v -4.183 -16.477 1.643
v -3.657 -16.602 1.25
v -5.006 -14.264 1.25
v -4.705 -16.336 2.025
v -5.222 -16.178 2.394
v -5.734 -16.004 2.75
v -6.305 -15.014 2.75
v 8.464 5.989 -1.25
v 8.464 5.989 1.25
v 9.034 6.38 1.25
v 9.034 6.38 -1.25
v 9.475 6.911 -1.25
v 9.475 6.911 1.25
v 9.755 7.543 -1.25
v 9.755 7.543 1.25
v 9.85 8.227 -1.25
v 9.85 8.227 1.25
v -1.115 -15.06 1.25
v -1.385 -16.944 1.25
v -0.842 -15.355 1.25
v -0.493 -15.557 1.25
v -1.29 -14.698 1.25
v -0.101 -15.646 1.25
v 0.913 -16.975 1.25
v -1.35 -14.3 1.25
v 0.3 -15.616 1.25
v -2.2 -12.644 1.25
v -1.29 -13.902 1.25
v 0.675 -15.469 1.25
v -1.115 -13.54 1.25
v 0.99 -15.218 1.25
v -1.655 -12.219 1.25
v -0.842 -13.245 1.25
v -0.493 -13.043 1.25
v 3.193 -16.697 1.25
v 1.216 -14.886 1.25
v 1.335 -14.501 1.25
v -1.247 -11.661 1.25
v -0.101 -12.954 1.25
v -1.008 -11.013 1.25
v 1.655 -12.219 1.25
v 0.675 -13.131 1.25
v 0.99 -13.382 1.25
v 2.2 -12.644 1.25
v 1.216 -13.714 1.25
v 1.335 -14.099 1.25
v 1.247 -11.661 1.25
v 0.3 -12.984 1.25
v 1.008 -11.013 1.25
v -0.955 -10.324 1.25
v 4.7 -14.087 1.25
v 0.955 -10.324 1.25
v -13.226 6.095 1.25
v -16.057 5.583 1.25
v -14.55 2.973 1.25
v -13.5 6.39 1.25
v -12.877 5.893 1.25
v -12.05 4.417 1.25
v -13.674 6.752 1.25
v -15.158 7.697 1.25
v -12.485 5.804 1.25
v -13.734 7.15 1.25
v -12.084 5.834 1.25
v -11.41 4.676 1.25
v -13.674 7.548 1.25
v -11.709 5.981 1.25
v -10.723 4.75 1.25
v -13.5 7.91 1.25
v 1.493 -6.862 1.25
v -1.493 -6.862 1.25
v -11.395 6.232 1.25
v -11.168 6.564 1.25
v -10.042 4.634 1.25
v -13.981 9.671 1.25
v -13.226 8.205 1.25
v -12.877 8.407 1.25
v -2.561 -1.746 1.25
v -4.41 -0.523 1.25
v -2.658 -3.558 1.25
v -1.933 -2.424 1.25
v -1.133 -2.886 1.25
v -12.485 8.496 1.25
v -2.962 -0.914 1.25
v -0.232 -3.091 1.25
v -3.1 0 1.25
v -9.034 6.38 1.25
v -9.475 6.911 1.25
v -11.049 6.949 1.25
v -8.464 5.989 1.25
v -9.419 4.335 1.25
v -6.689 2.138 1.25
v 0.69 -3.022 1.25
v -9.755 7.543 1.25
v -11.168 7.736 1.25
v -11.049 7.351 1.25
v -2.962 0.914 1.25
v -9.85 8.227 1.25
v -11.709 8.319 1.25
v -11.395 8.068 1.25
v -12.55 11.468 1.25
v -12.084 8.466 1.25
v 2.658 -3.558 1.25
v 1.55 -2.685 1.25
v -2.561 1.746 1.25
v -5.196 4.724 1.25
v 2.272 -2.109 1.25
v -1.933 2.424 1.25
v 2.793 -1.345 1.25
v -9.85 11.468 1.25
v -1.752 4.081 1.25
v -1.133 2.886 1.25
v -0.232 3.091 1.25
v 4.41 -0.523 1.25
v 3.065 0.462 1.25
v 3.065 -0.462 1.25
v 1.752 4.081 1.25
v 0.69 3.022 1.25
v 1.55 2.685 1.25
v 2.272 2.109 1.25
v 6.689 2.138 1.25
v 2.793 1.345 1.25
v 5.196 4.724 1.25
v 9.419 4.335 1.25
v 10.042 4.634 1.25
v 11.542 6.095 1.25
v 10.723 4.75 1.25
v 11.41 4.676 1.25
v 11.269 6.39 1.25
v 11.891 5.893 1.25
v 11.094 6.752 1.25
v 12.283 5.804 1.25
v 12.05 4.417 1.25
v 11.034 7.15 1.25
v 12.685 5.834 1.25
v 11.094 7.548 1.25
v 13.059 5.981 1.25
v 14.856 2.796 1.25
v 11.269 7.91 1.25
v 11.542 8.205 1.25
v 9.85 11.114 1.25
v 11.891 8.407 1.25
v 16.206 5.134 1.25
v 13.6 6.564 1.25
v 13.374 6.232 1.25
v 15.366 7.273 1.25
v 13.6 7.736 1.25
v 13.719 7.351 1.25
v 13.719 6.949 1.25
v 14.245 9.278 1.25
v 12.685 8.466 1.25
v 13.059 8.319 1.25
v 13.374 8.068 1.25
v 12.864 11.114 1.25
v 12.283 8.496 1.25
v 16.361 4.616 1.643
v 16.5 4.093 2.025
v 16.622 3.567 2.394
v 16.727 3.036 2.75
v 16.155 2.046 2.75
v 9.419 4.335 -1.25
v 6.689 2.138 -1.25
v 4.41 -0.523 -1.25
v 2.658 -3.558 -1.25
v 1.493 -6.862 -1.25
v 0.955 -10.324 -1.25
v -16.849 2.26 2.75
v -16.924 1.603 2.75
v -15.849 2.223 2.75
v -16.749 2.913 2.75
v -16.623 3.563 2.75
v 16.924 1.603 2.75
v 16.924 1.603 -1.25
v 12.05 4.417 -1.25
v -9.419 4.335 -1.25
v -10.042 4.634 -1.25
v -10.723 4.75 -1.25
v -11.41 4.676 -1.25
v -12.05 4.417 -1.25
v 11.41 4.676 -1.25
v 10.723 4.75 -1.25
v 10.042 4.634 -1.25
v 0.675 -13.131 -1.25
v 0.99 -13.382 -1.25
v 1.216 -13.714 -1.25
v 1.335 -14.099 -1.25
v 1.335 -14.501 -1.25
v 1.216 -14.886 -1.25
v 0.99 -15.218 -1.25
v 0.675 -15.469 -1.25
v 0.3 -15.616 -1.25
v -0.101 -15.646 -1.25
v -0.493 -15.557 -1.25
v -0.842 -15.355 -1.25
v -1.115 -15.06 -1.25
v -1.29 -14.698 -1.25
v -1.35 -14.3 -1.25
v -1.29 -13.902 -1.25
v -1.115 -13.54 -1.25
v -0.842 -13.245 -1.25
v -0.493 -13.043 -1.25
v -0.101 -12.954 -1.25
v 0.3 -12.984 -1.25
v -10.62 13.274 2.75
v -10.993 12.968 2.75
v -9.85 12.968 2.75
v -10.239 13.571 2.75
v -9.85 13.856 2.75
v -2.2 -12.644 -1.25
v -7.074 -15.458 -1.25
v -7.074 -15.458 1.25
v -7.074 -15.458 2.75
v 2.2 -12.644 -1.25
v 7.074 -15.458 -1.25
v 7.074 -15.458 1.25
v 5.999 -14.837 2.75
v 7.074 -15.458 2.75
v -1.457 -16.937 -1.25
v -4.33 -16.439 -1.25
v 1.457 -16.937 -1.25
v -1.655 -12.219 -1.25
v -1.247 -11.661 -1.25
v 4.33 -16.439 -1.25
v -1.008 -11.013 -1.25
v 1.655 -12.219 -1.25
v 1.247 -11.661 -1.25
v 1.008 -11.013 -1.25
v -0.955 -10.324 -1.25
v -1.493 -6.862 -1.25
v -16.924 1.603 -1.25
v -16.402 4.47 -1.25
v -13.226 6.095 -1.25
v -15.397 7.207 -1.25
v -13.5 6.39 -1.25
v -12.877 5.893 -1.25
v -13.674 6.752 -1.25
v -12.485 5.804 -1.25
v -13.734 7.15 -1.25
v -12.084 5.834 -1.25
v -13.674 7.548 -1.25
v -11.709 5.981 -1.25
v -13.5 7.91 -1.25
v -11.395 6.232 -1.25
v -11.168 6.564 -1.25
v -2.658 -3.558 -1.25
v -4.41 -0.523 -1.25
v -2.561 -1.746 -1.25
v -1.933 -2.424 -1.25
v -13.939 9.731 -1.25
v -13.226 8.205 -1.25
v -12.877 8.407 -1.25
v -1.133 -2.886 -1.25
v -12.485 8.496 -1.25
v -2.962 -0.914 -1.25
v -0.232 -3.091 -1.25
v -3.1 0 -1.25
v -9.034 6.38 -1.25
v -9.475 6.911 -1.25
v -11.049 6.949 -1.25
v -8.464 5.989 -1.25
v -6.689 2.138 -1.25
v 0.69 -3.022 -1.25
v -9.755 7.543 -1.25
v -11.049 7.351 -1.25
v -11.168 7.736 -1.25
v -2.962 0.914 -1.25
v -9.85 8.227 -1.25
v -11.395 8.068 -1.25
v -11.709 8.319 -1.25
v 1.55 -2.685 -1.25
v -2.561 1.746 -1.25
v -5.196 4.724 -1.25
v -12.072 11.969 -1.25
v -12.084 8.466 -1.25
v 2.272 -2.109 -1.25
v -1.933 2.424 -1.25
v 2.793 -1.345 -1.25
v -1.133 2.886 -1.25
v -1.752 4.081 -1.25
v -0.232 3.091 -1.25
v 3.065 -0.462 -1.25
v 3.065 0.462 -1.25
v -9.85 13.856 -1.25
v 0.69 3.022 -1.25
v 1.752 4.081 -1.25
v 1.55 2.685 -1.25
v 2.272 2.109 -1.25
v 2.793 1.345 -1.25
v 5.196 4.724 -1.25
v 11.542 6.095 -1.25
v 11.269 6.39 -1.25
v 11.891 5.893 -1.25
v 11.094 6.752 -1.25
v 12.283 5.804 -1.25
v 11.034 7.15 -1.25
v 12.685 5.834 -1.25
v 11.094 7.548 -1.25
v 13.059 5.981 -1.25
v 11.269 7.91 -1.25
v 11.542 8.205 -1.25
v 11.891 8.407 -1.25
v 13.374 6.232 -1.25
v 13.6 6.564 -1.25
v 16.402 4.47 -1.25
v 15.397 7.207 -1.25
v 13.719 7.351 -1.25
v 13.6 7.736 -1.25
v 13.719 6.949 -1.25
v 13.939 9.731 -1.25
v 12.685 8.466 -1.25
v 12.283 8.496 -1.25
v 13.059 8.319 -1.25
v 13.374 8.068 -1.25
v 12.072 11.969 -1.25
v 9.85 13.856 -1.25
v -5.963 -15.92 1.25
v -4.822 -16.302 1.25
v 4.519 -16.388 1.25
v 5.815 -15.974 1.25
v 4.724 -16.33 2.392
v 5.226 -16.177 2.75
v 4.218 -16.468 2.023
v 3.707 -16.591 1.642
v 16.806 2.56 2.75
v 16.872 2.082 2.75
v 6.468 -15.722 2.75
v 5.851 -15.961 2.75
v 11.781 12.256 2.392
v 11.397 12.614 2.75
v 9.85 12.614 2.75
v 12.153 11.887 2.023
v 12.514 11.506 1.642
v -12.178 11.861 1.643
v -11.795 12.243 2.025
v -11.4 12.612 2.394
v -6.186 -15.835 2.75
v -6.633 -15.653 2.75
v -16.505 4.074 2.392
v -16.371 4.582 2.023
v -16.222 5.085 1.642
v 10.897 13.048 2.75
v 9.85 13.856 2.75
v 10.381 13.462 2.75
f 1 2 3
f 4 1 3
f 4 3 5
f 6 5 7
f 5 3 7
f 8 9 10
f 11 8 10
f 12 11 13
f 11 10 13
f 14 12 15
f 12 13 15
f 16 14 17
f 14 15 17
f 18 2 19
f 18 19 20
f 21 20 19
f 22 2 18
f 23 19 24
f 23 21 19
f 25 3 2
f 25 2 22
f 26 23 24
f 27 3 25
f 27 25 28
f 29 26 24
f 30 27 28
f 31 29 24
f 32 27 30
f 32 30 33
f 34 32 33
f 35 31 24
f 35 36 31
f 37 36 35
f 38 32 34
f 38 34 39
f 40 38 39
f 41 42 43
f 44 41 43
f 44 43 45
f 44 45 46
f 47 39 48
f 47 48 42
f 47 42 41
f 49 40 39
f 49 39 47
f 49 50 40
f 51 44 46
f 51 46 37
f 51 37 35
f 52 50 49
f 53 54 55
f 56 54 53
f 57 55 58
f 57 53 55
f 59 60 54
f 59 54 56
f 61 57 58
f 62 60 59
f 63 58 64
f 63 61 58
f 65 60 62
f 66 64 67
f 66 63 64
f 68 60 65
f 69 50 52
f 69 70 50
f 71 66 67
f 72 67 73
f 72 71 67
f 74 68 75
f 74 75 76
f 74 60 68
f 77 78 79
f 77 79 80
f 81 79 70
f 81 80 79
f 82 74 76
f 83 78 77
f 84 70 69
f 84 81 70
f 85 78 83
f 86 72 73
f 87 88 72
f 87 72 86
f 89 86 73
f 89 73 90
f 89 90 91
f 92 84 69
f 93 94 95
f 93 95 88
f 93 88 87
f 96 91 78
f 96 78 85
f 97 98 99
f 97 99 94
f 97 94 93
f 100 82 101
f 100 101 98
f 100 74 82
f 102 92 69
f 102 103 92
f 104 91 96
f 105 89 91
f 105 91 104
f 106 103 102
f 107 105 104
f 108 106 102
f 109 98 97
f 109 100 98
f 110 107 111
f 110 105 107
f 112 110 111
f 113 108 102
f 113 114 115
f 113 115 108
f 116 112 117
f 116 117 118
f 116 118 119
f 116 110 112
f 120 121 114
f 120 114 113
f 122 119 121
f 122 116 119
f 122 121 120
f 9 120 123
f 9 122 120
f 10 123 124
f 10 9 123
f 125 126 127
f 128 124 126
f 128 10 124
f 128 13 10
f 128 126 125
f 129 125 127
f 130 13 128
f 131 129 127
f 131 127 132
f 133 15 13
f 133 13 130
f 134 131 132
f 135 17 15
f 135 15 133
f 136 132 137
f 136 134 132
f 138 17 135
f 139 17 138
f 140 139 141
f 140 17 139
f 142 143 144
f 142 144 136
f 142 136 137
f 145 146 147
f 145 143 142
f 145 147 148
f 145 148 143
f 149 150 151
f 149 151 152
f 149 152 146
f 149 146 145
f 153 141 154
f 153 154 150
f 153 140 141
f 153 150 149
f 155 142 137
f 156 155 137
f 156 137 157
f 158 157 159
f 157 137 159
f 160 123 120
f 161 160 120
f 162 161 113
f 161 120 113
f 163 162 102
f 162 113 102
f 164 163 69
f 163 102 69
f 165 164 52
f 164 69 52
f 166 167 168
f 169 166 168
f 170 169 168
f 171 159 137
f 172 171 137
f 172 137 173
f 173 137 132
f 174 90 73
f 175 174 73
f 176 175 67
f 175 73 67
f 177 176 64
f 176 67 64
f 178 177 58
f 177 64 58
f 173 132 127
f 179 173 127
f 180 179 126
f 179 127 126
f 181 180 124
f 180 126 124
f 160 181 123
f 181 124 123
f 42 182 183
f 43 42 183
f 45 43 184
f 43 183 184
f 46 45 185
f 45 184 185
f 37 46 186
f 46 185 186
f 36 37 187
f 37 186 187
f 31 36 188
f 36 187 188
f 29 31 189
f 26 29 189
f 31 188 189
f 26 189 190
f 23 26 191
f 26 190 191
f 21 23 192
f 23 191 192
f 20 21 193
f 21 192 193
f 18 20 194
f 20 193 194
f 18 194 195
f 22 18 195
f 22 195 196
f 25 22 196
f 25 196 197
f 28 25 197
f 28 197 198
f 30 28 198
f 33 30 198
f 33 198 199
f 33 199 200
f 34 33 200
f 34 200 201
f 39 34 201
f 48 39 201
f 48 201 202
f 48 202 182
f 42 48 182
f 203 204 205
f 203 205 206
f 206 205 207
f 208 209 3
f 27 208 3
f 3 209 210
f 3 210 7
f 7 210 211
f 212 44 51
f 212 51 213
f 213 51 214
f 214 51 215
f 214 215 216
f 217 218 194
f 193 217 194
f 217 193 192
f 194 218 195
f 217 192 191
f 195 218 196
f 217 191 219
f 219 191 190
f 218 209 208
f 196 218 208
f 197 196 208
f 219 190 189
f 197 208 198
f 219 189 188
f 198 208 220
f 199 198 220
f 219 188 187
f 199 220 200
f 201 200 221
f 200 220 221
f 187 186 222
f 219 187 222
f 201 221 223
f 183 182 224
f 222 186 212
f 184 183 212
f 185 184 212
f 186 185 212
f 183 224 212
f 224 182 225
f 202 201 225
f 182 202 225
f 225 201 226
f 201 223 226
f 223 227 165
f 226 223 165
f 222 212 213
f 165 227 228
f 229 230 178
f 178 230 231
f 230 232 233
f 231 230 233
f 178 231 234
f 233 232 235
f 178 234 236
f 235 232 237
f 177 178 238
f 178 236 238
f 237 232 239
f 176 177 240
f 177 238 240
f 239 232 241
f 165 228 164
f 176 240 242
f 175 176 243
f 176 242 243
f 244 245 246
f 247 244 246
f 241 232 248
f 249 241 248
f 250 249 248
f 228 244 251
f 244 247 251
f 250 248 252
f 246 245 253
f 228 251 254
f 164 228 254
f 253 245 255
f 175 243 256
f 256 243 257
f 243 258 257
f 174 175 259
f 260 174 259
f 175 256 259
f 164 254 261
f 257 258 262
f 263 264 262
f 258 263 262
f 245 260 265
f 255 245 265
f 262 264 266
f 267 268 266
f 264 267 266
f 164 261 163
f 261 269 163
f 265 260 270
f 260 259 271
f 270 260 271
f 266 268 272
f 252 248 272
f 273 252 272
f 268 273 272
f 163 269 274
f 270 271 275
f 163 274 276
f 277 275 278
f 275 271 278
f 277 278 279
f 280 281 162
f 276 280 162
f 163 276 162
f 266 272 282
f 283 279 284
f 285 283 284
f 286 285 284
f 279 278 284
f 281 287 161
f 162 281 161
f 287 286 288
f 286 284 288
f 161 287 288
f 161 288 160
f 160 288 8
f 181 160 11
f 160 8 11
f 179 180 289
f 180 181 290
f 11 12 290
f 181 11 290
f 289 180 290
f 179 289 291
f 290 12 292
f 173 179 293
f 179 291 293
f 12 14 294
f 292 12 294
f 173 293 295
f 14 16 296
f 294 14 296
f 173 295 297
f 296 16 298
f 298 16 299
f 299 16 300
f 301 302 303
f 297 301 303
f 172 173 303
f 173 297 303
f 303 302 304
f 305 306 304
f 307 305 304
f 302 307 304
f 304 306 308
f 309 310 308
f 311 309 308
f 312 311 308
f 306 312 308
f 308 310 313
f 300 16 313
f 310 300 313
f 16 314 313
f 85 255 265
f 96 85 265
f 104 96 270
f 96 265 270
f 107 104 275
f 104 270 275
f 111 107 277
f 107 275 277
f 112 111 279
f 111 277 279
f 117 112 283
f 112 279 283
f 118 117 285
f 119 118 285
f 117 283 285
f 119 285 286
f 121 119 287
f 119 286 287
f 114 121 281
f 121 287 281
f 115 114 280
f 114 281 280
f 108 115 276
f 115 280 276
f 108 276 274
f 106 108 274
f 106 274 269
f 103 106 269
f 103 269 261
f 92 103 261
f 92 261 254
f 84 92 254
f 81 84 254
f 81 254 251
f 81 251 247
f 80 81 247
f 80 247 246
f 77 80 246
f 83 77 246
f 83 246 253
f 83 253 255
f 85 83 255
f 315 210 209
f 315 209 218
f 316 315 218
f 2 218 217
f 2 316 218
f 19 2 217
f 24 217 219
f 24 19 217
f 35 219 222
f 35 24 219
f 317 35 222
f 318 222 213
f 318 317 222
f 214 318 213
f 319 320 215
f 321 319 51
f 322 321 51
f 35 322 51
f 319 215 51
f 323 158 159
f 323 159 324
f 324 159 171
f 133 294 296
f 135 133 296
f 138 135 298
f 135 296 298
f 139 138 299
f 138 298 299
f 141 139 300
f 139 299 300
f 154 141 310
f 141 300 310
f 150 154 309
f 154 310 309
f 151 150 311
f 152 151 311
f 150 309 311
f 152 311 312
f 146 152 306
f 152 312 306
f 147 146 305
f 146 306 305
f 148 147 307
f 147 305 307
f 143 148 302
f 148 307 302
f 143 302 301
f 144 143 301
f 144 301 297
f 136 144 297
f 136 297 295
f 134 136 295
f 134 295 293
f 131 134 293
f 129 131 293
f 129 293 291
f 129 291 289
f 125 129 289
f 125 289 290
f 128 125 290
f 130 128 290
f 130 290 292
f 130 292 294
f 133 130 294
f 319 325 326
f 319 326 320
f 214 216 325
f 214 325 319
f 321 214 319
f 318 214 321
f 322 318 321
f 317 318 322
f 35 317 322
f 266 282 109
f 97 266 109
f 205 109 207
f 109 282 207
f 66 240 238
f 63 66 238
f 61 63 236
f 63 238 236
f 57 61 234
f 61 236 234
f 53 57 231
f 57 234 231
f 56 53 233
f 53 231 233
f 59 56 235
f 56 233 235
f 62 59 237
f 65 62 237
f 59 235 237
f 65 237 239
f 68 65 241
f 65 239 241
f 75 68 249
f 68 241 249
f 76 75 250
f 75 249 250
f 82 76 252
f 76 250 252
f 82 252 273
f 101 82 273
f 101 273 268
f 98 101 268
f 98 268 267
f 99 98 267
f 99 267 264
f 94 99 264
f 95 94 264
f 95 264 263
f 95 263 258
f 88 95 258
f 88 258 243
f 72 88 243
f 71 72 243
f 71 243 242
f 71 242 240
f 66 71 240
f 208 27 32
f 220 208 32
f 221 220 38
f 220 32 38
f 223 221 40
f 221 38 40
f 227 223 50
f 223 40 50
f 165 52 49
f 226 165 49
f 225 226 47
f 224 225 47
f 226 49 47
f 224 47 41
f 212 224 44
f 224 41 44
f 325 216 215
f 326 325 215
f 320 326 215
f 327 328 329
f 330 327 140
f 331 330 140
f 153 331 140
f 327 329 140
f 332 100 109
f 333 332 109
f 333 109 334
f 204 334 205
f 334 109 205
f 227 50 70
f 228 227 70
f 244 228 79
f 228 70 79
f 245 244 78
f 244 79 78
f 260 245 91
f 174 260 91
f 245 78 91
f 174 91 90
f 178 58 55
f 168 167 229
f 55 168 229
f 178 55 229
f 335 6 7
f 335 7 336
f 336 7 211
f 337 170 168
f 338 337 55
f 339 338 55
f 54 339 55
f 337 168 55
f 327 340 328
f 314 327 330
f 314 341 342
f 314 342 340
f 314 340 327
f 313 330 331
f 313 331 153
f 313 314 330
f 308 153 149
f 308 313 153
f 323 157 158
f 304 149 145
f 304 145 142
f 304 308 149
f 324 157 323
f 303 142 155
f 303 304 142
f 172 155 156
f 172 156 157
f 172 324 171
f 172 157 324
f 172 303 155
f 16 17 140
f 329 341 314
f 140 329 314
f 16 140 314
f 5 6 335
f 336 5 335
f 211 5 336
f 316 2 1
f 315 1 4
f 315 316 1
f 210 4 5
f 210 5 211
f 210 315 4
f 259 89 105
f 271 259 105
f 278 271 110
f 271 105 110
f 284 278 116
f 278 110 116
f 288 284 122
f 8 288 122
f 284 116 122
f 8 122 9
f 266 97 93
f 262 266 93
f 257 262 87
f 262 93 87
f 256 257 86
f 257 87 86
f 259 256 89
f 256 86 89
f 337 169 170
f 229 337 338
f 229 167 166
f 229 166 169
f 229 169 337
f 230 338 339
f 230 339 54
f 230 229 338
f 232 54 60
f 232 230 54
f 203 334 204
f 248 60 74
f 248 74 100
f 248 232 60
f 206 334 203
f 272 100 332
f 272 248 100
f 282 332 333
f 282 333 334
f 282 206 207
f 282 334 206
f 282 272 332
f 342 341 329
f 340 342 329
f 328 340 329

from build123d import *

# Parameters (mm, degrees)
ESQUISSE1_R                     = 17
BOSS_EXTRU_1_DEPTH              = 1.25
ENL_V_MAT_EXTRU_1_DEPTH         = 25.171263931
D_GAGEMENT_M2_51_D              = 2.7
R_P_TITION_CIRCULAIRE1_COUNT    = 3
DIAM_TRE_DU_PER_AGE_6_2_6_2_1_D = 6.2
BOSS_EXTRU_2_REACH              = 33.74
BOSS_EXTRU_2_END_RADIUS         = 17
BOSS_EXTRU_3_REACH              = 33.834
BOSS_EXTRU_3_END_RADIUS         = 17
R_P_TITION_CIRCULAIRE2_COUNT    = 3


with BuildPart() as part:
    # Esquisse1 → Boss.-Extru.1 (new, symmetric)
    with BuildSketch(Plane.XY):
        Circle(ESQUISSE1_R)
    extrude(amount=BOSS_EXTRU_1_DEPTH, both=True)

    # Esquisse2 → Enlèv. mat.-Extru.1 (cut, through all)
    with BuildSketch(Plane.XY.offset(1.25)):
        with BuildLine():
            Line((-9.85, 13.855594538), (-9.85, 8.227474827))
            ThreePointArc((-9.85, 8.227474827), (-9.475334198, 6.911057512), (-8.463636364, 5.989213437))
            ThreePointArc((-8.463636364, 5.989213437), (0, 4), (8.463636364, 5.989213437))
            ThreePointArc((8.463636364, 5.989213437), (9.475334198, 6.911057512), (9.85, 8.227474827))
            Line((9.85, 8.227474827), (9.85, 13.855594538))
            ThreePointArc((9.85, 13.855594538), (0, 17), (-9.85, 13.855594538))
        make_face()
    enl_v_mat_extru_1 = extrude(amount=-ENL_V_MAT_EXTRU_1_DEPTH, mode=Mode.SUBTRACT)

    # Dégagement M2.51 (through all)
    with Locations(Plane.XY.offset(1.25)):
        with Locations((12.384163274, 7.15)):
            d_gagement_m2_51 = Hole(D_GAGEMENT_M2_51_D / 2)

    # Répétition circulaire1: Enlèv. mat.-Extru.1, Dégagement M2.51 ×3 about axis
    r_p_tition_circulaire1_axis = Axis((0, 0, 0), (0, 0, 1))
    add([enl_v_mat_extru_1.rotate(r_p_tition_circulaire1_axis, i * 360 / R_P_TITION_CIRCULAIRE1_COUNT) for i in range(1, R_P_TITION_CIRCULAIRE1_COUNT)], mode=Mode.SUBTRACT)
    add([d_gagement_m2_51.rotate(r_p_tition_circulaire1_axis, i * 360 / R_P_TITION_CIRCULAIRE1_COUNT) for i in range(1, R_P_TITION_CIRCULAIRE1_COUNT)], mode=Mode.SUBTRACT)

    # Diamètre du perçage Ø6.2 (6.2)1 (through all)
    with Locations(Plane.XY.offset(1.25)):
        with Locations((0, 0)):
            Hole(DIAM_TRE_DU_PER_AGE_6_2_6_2_1_D / 2)

    # Boss.-Extru.2: up to this cylinder (the profile starts inside it)
    boss_extru_2_end = Plane(origin=(0, 0, 1.885519), z_dir=(0, 0, -1)) * Cylinder(BOSS_EXTRU_2_END_RADIUS, 102.48, mode=Mode.PRIVATE)
    # Esquisse8 → Boss.-Extru.2 (add, up to the surface)
    with BuildSketch(Plane(origin=(-9.85, 0, 0), x_dir=(0, 0, -1), z_dir=(1, 0, 0)), mode=Mode.PRIVATE) as boss_extru_2_sk1:
        Polygon((-1.25, 11.467766953), (-2.75, 12.967766953), (-2.75, 13.855594538), (-1.25, 13.855594538), align=None)
    boss_extru_2_tool1 = extrude(boss_extru_2_sk1.sketch, amount=-BOSS_EXTRU_2_REACH, mode=Mode.PRIVATE) & boss_extru_2_end
    boss_extru_2 = boss_extru_2_tool1.solids().sort_by_distance((-9.85, 12.97944, 1.885519))[0]
    add(boss_extru_2)

    # Boss.-Extru.3: up to this cylinder (the profile starts inside it)
    boss_extru_3_end = Plane(origin=(0, 0, 1.905844), z_dir=(0, 0, -1)) * Cylinder(BOSS_EXTRU_3_END_RADIUS, 102.668, mode=Mode.PRIVATE)
    # Esquisse9 → Boss.-Extru.3 (add, up to the surface)
    with BuildSketch(Plane.ZY.offset(-9.85), mode=Mode.PRIVATE) as boss_extru_3_sk1:
        Polygon((1.25, 13.855594538), (2.75, 13.855594538), (2.75, 12.614213562), (1.25, 11.114213562), align=None)
    boss_extru_3_tool1 = extrude(boss_extru_3_sk1.sketch, amount=-BOSS_EXTRU_3_REACH, mode=Mode.PRIVATE) & boss_extru_3_end
    boss_extru_3 = boss_extru_3_tool1.solids().sort_by_distance((9.85, 12.812826, 1.905844))[0]
    add(boss_extru_3)

    # Répétition circulaire2: Boss.-Extru.2, Boss.-Extru.3 ×3 about axis
    r_p_tition_circulaire2_axis = Axis((0, 0, 0), (0, 0, 1))
    add([boss_extru_2.rotate(r_p_tition_circulaire2_axis, i * 360 / R_P_TITION_CIRCULAIRE2_COUNT) for i in range(1, R_P_TITION_CIRCULAIRE2_COUNT)])
    add([boss_extru_3.rotate(r_p_tition_circulaire2_axis, i * 360 / R_P_TITION_CIRCULAIRE2_COUNT) for i in range(1, R_P_TITION_CIRCULAIRE2_COUNT)])


solid = part.part
